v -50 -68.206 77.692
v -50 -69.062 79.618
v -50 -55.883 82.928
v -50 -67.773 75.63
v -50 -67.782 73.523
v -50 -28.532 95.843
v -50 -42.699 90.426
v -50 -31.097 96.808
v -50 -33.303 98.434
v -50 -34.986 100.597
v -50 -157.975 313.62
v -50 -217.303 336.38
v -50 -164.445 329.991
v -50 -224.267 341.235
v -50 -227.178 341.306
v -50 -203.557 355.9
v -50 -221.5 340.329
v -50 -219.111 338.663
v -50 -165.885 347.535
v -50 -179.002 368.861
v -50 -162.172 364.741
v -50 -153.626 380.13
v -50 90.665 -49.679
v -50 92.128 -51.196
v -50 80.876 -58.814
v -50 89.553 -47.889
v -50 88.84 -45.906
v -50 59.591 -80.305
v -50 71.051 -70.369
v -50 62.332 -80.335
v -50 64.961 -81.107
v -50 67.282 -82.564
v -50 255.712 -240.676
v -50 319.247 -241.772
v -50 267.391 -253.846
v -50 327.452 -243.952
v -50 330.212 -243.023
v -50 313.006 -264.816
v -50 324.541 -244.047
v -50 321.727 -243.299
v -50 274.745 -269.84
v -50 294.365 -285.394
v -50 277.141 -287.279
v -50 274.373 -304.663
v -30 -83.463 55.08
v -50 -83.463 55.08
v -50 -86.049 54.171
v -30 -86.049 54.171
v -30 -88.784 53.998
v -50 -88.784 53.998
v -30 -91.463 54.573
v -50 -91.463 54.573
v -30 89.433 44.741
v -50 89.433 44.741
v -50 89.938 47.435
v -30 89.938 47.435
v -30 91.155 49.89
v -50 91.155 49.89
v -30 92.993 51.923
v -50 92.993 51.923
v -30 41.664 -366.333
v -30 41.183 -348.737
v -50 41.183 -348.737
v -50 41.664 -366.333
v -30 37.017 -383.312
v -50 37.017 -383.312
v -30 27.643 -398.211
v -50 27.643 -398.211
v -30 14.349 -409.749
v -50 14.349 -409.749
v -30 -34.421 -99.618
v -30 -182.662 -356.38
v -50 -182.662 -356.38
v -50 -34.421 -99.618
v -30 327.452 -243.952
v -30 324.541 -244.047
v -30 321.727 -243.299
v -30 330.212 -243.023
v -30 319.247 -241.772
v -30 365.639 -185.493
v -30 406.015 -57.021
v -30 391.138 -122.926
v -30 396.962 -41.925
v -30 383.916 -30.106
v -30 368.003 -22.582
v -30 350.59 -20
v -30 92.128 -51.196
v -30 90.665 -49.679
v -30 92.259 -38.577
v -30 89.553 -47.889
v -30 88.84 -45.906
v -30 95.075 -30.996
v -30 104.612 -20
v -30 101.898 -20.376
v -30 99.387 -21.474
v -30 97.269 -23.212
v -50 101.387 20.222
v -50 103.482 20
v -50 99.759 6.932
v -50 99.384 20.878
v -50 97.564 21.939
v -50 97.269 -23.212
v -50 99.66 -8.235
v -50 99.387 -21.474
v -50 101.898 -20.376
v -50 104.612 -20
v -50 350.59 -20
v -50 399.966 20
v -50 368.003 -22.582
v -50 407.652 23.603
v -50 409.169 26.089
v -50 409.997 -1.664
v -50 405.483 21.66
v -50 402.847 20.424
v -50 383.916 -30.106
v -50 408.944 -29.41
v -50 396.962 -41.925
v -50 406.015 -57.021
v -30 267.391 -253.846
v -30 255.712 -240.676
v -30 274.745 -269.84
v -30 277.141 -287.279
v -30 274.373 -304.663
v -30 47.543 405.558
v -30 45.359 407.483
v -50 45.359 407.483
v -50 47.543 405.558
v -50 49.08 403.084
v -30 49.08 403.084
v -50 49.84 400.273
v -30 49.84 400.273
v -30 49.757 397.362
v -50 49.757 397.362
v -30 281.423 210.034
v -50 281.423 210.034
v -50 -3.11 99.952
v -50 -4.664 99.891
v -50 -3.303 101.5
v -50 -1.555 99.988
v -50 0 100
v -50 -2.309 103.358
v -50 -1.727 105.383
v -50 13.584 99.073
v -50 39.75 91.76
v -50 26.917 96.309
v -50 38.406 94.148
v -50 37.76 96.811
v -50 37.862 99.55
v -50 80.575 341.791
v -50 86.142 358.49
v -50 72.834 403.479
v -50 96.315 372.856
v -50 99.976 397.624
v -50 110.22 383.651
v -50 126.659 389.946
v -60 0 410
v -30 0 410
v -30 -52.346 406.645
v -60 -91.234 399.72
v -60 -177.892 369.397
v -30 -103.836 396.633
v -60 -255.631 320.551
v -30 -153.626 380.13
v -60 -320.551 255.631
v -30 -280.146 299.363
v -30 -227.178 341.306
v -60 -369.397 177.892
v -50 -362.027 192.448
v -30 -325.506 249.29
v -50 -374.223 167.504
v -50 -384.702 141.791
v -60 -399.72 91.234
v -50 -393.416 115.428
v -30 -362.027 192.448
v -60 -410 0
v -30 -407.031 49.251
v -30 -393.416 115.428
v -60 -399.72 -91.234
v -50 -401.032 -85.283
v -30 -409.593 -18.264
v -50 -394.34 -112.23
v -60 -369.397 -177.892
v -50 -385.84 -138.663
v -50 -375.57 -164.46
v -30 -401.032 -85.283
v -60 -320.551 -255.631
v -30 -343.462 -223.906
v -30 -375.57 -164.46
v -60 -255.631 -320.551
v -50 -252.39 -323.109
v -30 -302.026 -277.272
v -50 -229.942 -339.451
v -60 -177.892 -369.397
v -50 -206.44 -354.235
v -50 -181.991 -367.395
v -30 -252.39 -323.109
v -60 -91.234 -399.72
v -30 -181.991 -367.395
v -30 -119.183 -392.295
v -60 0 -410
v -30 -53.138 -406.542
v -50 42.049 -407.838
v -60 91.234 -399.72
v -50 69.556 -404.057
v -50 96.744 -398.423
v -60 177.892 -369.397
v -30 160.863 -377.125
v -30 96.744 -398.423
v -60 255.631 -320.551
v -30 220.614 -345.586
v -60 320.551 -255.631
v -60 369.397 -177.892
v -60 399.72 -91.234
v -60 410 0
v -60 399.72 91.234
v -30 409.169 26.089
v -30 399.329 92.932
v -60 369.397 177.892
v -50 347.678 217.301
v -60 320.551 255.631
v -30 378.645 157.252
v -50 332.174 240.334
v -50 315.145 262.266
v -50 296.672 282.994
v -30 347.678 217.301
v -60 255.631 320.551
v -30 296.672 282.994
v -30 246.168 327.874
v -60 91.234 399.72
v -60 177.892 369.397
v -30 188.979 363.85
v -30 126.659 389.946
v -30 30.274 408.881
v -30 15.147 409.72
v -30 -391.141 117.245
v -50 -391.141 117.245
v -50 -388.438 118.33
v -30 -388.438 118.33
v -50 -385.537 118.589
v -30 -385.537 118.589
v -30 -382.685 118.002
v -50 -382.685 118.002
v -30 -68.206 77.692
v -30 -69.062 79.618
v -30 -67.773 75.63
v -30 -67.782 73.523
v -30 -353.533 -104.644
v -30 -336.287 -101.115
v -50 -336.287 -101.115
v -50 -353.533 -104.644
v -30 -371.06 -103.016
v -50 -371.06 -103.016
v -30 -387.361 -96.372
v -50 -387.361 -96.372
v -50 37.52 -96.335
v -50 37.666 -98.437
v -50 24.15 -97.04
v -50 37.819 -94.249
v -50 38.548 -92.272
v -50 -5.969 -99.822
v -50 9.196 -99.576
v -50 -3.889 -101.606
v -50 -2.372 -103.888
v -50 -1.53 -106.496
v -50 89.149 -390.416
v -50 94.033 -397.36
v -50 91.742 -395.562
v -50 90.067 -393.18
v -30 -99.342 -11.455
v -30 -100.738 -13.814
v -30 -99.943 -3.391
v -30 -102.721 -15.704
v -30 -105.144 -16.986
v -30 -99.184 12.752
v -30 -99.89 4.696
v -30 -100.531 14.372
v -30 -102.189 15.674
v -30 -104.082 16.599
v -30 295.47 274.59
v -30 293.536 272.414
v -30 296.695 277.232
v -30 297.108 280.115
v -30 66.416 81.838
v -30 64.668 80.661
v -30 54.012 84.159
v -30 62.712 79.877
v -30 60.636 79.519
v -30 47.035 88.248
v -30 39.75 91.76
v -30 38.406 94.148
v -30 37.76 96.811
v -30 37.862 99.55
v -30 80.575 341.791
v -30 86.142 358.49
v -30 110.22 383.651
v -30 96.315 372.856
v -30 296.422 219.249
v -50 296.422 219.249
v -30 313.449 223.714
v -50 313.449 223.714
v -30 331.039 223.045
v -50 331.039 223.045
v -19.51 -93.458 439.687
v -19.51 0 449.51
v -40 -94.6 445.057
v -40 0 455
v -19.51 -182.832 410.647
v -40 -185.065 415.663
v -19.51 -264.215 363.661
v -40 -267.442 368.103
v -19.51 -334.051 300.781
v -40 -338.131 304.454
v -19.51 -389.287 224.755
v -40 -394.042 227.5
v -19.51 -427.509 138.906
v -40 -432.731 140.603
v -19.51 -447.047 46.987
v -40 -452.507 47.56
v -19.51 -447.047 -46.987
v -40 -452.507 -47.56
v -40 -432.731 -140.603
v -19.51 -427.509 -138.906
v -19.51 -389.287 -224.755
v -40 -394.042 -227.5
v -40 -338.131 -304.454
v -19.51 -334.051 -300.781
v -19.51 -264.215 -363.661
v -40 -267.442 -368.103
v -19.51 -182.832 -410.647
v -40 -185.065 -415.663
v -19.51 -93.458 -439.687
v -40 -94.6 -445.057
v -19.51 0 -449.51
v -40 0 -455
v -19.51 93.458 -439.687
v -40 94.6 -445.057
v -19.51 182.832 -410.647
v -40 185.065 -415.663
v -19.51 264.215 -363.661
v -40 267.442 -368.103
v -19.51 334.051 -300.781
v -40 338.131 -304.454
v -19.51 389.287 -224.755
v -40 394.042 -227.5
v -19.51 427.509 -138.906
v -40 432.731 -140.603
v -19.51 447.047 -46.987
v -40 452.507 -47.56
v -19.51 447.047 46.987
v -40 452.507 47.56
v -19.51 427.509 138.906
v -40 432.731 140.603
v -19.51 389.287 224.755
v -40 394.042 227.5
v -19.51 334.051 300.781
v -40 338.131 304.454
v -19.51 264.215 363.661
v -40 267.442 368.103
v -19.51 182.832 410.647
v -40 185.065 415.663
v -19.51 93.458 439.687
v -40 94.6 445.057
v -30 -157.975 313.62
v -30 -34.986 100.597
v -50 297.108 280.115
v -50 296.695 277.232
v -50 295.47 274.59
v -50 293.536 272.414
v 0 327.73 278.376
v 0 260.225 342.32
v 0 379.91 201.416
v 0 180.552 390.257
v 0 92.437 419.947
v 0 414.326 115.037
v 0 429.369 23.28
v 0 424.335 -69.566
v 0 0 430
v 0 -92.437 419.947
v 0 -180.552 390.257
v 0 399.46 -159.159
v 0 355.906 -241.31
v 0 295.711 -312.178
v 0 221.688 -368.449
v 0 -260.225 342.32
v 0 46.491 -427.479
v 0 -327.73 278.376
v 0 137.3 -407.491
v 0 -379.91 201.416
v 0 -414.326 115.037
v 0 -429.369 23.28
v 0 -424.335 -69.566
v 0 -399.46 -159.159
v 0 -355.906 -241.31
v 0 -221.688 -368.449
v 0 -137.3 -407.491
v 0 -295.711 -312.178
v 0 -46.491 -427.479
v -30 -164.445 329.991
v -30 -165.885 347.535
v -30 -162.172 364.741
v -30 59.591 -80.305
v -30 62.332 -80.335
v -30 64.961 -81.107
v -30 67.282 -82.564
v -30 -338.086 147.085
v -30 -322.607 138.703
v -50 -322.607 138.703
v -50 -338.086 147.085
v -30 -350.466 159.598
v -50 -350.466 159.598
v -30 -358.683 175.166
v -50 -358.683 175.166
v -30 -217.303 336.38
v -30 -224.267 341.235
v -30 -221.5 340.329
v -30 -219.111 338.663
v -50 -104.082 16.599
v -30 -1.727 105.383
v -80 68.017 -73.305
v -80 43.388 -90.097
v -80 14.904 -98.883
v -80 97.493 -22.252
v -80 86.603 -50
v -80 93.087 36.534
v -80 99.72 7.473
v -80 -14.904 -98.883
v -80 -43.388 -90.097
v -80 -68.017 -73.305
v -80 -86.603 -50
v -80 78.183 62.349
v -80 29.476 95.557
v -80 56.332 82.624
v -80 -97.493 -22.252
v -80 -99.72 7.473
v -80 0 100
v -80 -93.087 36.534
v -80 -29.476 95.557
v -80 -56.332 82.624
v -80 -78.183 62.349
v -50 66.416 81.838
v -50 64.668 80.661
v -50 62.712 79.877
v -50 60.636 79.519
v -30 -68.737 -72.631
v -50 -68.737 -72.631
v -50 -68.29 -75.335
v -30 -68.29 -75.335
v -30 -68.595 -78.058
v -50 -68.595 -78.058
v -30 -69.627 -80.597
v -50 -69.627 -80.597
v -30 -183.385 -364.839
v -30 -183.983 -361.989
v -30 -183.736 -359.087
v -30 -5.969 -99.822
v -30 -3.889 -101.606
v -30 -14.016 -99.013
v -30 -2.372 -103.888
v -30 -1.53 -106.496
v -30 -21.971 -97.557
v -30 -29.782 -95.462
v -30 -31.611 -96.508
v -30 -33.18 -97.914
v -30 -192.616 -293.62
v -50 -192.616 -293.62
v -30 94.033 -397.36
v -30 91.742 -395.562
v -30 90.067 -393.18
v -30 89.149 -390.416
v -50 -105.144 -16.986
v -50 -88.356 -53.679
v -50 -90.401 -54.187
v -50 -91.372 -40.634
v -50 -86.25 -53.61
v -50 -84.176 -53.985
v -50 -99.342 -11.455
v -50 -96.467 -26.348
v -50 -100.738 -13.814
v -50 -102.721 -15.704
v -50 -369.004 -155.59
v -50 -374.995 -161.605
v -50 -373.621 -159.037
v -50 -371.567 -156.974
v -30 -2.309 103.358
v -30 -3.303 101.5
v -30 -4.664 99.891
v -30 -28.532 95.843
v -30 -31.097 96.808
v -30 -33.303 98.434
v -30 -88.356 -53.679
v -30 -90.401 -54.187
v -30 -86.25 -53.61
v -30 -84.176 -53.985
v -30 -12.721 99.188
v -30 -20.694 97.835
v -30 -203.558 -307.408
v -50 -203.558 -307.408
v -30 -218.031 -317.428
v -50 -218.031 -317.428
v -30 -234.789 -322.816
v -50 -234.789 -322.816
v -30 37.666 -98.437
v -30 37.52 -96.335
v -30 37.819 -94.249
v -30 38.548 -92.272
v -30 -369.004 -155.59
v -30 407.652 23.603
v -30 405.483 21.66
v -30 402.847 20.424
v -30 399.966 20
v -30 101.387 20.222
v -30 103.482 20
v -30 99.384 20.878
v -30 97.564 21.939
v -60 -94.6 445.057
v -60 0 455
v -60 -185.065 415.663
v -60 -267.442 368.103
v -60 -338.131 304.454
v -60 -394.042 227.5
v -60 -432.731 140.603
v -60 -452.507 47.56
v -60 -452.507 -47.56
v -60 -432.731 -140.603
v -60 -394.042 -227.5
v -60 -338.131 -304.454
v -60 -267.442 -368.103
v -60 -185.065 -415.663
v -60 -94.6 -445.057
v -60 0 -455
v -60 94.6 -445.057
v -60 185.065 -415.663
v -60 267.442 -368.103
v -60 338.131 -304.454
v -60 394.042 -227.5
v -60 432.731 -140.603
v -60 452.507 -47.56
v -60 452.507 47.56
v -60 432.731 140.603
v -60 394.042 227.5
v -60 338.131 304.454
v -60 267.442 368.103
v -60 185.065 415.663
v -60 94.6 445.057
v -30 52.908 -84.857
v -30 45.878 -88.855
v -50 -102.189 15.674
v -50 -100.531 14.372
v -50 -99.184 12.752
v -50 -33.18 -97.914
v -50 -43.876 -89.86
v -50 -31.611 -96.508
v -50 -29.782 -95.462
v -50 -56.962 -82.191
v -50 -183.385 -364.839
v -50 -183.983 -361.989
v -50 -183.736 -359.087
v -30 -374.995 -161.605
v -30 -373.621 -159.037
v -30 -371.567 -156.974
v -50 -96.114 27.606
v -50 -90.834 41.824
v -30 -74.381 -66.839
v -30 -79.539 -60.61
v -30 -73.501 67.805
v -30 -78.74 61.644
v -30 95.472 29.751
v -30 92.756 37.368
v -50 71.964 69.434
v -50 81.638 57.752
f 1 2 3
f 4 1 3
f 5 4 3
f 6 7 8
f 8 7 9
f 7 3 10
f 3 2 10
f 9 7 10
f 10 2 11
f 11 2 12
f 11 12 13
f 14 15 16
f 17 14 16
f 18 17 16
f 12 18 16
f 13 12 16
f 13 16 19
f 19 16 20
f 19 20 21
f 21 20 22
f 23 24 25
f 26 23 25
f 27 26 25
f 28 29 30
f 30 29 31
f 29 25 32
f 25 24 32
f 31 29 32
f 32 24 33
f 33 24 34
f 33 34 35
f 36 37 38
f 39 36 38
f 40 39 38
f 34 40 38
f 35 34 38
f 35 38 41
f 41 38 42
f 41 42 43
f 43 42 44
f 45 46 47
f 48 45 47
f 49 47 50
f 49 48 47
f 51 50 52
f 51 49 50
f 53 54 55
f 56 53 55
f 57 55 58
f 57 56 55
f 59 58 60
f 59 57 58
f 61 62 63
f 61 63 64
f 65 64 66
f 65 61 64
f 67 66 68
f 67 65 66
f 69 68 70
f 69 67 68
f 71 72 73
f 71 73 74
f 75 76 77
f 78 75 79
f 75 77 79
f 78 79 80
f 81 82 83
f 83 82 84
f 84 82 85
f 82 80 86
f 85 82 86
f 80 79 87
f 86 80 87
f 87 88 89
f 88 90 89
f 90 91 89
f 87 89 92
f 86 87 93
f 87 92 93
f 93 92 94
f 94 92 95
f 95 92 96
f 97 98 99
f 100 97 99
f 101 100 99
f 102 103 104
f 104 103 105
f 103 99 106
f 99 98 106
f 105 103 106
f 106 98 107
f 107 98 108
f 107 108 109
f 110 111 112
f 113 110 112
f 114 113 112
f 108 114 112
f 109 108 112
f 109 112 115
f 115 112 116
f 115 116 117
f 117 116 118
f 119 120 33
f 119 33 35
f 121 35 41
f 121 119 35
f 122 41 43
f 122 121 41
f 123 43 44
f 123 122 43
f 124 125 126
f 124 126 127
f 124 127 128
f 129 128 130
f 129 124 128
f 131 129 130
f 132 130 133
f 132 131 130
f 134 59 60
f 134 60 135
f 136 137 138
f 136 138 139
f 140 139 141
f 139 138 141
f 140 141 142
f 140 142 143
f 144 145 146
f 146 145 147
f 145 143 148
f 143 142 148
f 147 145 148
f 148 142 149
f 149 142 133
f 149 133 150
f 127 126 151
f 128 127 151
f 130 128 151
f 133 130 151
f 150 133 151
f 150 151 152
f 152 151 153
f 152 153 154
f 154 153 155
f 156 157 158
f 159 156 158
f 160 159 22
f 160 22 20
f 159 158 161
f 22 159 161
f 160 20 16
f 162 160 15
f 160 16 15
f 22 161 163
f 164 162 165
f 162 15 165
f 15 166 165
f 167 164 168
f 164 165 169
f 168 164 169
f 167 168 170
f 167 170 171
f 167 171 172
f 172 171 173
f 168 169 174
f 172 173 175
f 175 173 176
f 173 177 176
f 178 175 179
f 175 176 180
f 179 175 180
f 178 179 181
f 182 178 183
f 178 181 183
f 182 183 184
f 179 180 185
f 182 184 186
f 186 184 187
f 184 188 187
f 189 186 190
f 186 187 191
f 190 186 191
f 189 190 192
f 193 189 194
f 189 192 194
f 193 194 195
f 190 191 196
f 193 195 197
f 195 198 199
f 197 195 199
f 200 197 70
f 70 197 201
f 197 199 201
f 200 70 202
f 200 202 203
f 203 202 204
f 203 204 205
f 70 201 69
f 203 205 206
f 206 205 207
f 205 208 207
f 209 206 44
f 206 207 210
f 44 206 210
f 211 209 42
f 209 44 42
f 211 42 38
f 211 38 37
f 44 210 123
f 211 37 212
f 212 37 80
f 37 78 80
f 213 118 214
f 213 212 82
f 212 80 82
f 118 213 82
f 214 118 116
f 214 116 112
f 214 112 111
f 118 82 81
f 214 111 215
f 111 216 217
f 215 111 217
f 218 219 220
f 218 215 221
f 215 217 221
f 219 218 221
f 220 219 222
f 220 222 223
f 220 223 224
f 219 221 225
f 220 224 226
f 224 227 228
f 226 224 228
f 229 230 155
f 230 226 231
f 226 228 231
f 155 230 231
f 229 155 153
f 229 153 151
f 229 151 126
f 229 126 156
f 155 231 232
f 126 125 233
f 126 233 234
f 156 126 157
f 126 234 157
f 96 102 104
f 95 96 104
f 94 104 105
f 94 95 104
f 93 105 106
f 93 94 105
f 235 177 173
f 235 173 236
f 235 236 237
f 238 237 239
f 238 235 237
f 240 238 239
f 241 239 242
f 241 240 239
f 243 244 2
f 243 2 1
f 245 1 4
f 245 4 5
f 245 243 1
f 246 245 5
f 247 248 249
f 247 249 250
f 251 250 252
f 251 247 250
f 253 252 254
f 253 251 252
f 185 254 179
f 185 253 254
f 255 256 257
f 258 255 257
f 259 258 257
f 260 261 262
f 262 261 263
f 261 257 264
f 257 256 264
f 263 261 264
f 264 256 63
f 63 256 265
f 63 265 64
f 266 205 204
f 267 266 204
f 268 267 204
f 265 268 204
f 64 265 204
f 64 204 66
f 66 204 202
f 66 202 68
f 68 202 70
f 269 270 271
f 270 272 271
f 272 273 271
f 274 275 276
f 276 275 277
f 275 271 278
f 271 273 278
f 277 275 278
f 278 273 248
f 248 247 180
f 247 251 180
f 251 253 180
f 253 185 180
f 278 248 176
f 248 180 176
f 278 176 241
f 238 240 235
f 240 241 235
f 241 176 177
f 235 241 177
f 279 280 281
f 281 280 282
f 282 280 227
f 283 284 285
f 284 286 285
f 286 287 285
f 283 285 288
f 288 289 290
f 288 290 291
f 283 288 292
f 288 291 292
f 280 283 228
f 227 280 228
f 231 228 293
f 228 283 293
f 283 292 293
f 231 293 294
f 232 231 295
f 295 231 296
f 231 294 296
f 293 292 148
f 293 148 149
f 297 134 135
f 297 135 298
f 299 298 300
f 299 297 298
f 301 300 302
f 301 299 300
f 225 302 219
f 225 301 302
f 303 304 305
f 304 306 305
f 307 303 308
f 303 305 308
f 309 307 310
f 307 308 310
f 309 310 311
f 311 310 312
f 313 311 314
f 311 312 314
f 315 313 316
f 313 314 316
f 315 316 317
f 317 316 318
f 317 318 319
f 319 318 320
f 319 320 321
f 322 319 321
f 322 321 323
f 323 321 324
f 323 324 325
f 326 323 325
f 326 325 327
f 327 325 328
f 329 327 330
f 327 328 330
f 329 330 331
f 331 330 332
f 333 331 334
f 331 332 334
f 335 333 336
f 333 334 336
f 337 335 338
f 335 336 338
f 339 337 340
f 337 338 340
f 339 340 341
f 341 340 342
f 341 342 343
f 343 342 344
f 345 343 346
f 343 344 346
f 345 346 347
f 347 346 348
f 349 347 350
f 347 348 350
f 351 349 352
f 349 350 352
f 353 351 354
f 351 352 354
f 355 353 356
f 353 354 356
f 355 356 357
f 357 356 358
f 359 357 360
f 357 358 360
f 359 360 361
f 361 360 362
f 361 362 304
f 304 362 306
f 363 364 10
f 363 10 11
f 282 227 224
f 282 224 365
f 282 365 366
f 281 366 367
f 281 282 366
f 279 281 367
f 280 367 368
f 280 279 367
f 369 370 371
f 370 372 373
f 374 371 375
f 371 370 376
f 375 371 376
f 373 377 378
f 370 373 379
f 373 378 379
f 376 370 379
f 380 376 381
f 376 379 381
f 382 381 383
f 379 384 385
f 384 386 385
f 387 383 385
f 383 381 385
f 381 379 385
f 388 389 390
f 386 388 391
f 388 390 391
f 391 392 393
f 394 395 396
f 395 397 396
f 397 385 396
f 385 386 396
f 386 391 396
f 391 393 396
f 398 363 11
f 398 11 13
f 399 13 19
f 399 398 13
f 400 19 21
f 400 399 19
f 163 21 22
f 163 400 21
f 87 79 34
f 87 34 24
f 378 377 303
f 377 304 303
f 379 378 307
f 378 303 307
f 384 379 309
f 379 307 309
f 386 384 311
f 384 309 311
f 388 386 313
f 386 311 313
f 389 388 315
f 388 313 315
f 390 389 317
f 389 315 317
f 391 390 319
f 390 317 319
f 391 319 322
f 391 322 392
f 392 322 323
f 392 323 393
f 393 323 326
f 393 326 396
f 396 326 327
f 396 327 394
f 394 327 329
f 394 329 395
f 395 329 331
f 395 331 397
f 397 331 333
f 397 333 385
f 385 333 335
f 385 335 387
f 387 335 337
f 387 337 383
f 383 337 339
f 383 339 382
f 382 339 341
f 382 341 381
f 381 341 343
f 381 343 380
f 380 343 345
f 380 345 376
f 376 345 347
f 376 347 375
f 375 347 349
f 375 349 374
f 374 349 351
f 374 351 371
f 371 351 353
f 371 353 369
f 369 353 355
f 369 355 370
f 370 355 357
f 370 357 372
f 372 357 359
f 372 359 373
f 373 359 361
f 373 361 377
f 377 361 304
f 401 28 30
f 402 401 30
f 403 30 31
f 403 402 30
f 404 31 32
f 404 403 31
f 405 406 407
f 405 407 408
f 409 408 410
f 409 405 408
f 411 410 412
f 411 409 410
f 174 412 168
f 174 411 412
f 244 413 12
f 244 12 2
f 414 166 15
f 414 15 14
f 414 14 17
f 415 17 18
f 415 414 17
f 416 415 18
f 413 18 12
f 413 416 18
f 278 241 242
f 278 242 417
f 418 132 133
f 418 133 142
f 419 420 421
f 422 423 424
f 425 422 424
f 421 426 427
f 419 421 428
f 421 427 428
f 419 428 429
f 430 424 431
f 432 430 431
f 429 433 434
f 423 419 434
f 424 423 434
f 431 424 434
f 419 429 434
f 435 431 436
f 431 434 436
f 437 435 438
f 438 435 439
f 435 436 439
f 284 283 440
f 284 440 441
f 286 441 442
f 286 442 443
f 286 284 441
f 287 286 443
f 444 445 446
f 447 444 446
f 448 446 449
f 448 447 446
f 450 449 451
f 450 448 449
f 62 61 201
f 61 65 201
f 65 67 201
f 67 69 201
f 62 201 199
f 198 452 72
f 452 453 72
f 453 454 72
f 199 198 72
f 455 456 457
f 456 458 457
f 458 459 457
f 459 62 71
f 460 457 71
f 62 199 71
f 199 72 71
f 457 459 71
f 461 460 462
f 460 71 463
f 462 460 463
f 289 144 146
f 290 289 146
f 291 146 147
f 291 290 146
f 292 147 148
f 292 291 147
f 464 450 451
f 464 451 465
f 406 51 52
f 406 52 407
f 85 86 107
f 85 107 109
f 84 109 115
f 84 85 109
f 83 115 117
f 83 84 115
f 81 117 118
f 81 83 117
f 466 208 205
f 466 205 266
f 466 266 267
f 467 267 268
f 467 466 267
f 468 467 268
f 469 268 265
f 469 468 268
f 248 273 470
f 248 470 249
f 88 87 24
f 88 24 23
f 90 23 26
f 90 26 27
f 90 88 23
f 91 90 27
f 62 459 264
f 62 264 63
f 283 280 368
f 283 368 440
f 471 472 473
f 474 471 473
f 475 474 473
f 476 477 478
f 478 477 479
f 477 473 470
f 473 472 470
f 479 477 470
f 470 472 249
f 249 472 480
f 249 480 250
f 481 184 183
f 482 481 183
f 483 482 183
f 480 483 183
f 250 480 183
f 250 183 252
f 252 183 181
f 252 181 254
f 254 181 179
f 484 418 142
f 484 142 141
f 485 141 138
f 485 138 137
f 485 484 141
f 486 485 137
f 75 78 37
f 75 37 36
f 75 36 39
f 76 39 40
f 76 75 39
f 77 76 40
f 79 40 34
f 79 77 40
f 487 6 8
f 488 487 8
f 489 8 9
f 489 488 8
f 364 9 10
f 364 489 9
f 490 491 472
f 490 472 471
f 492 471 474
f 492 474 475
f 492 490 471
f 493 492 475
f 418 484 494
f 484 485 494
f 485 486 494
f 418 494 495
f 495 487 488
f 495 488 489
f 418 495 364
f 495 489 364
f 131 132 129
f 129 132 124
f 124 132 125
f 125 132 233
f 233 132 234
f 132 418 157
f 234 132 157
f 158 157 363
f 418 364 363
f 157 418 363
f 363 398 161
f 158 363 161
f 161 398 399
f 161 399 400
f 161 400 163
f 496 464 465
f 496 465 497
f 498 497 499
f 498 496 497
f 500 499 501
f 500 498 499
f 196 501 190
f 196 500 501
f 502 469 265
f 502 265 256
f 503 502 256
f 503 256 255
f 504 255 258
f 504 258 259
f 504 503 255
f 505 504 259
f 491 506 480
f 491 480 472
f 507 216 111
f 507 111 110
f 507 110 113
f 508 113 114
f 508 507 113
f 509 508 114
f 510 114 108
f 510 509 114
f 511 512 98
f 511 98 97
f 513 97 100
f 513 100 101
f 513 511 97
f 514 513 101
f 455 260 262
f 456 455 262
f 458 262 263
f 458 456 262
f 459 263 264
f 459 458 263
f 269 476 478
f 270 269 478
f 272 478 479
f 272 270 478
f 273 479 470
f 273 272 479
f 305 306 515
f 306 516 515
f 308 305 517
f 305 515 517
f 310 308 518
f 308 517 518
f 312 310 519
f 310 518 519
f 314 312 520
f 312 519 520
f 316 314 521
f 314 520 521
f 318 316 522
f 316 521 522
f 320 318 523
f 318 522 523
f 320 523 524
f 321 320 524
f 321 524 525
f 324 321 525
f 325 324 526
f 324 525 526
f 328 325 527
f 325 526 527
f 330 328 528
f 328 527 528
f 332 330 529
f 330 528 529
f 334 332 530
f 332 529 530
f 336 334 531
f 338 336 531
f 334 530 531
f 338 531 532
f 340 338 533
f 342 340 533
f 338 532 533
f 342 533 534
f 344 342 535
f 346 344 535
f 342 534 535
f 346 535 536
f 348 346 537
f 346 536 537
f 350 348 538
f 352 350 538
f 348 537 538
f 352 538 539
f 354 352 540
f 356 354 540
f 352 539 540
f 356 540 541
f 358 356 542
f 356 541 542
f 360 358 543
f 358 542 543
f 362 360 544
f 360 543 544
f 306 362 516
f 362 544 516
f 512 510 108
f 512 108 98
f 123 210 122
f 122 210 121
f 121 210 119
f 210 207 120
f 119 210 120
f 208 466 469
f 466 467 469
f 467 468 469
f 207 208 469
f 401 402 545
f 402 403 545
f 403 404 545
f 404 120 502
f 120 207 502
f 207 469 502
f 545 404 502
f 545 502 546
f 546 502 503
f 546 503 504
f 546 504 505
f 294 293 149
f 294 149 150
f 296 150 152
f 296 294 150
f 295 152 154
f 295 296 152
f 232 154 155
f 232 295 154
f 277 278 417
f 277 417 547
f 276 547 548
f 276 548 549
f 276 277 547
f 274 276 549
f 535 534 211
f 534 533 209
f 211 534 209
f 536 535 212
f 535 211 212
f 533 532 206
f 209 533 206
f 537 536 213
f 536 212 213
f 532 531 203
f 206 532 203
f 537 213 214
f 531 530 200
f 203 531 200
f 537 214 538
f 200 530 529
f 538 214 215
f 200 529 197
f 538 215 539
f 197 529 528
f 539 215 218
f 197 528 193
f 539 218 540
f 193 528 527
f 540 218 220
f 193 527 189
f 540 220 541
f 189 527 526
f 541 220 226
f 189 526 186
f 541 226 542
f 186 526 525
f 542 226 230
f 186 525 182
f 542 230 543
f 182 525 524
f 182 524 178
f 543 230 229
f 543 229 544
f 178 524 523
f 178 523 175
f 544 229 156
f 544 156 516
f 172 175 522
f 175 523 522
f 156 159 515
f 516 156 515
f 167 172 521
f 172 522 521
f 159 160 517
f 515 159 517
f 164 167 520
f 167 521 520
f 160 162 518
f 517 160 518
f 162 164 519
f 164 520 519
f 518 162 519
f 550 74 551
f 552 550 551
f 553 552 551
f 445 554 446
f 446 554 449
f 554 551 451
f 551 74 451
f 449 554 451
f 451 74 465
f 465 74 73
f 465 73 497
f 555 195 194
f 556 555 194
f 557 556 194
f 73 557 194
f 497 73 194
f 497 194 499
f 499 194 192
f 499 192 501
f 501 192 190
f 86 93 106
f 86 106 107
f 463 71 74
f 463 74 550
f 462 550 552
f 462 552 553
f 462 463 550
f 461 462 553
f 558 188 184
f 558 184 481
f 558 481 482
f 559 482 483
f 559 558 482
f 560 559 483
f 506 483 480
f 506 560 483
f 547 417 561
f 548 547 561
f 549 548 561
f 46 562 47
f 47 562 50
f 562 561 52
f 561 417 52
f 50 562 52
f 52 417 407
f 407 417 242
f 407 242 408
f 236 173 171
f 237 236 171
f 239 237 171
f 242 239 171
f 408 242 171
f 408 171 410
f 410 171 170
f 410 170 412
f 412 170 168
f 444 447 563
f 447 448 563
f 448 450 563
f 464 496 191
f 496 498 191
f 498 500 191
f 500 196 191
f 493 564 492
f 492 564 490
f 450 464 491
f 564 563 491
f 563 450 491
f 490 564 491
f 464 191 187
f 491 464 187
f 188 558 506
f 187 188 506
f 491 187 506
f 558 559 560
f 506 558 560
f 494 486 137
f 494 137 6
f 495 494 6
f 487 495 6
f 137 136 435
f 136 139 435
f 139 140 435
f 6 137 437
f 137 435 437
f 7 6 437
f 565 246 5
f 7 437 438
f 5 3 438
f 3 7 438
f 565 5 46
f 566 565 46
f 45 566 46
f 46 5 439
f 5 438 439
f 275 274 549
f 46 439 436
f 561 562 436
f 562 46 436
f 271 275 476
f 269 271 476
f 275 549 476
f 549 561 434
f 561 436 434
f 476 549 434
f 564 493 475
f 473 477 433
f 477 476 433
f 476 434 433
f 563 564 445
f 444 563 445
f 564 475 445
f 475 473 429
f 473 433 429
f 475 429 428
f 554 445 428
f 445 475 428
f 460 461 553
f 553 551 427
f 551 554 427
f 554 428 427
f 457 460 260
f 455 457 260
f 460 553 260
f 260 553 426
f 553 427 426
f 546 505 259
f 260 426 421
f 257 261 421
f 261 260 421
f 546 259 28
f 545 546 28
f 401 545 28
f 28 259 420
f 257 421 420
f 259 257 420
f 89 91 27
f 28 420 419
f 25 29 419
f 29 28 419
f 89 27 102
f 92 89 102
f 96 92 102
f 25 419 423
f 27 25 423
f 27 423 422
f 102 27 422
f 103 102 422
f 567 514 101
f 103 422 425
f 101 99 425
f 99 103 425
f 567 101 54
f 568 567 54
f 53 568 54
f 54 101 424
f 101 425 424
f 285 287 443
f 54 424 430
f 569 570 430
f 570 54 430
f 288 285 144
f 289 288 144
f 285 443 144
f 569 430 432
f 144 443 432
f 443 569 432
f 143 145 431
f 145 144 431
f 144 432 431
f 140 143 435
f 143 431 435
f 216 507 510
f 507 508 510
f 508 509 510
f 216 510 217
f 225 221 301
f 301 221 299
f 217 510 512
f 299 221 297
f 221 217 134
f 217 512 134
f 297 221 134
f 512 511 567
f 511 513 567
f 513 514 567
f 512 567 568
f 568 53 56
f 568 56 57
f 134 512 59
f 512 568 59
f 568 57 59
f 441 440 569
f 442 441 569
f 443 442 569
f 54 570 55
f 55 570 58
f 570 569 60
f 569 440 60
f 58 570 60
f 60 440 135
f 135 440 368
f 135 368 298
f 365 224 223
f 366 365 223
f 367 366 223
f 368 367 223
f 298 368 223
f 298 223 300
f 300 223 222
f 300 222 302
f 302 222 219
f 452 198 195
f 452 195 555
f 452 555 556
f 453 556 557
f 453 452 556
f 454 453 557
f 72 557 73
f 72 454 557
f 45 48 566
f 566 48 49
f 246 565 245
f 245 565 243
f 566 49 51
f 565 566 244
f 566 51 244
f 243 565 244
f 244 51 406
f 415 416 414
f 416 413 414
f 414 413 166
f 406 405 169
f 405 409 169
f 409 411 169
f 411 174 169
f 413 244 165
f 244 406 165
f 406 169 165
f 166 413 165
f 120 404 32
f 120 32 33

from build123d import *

# Parameters (mm, degrees)
BOSS_EXTRU_1_DEPTH           = 20
R_P_TITION_CIRCULAIRE1_COUNT = 9


with BuildPart() as part:
    # Esquisse1 → Révolution1 (revolve)
    with BuildSketch(Plane.XY, mode=Mode.PRIVATE) as r_volution1_sk:
        Polygon((0, 0), (0, 430), (-19.509618943, 449.509618943), (-40, 455), (-60, 455), (-60, 410), (-30, 410), (-30, 100), (-80, 100), (-80, 0), align=None)
    revolve(r_volution1_sk.sketch.rotate(Axis((-80, 0, 0), (1, 0, 0)), 90), axis=Axis((-80, 0, 0), (1, 0, 0)))

    # Esquisse2 → Boss.-Extru.1 (add)
    with BuildSketch(Plane.ZY.offset(30)):
        with BuildLine():
            Line((-20, 104.612235173), (-20, 350.590090575))
            ThreePointArc((-20, 350.590090575), (-30.106477192, 383.916302208), (-57.021212726, 406.015493915))
            ThreePointArc((-57.021212726, 406.015493915), (-15.546179109, 409.705157784), (26.089198597, 409.169101615))
            ThreePointArc((26.089198597, 409.169101615), (21.660095503, 405.483324106), (20, 399.965535329))
            Line((20, 399.965535329), (20, 103.482062221))
            ThreePointArc((20, 103.482062221), (20.497231695, 100.367998231), (21.939478907, 97.563616504))
            ThreePointArc((21.939478907, 97.563616504), (-0.653338085, 99.997865724), (-23.212419248, 97.268615661))
            ThreePointArc((-23.212419248, 97.268615661), (-20.838236864, 100.60448066), (-20, 104.612235173))
        make_face()
    boss_extru_1 = extrude(amount=BOSS_EXTRU_1_DEPTH)

    # Répétition circulaire1: Boss.-Extru.1 ×9 about axis
    r_p_tition_circulaire1_axis = Axis((0, 0, 0), (1, 0, 0))
    for i in range(1, R_P_TITION_CIRCULAIRE1_COUNT):
        add(boss_extru_1.rotate(r_p_tition_circulaire1_axis, i * 360 / R_P_TITION_CIRCULAIRE1_COUNT))


solid = part.part
